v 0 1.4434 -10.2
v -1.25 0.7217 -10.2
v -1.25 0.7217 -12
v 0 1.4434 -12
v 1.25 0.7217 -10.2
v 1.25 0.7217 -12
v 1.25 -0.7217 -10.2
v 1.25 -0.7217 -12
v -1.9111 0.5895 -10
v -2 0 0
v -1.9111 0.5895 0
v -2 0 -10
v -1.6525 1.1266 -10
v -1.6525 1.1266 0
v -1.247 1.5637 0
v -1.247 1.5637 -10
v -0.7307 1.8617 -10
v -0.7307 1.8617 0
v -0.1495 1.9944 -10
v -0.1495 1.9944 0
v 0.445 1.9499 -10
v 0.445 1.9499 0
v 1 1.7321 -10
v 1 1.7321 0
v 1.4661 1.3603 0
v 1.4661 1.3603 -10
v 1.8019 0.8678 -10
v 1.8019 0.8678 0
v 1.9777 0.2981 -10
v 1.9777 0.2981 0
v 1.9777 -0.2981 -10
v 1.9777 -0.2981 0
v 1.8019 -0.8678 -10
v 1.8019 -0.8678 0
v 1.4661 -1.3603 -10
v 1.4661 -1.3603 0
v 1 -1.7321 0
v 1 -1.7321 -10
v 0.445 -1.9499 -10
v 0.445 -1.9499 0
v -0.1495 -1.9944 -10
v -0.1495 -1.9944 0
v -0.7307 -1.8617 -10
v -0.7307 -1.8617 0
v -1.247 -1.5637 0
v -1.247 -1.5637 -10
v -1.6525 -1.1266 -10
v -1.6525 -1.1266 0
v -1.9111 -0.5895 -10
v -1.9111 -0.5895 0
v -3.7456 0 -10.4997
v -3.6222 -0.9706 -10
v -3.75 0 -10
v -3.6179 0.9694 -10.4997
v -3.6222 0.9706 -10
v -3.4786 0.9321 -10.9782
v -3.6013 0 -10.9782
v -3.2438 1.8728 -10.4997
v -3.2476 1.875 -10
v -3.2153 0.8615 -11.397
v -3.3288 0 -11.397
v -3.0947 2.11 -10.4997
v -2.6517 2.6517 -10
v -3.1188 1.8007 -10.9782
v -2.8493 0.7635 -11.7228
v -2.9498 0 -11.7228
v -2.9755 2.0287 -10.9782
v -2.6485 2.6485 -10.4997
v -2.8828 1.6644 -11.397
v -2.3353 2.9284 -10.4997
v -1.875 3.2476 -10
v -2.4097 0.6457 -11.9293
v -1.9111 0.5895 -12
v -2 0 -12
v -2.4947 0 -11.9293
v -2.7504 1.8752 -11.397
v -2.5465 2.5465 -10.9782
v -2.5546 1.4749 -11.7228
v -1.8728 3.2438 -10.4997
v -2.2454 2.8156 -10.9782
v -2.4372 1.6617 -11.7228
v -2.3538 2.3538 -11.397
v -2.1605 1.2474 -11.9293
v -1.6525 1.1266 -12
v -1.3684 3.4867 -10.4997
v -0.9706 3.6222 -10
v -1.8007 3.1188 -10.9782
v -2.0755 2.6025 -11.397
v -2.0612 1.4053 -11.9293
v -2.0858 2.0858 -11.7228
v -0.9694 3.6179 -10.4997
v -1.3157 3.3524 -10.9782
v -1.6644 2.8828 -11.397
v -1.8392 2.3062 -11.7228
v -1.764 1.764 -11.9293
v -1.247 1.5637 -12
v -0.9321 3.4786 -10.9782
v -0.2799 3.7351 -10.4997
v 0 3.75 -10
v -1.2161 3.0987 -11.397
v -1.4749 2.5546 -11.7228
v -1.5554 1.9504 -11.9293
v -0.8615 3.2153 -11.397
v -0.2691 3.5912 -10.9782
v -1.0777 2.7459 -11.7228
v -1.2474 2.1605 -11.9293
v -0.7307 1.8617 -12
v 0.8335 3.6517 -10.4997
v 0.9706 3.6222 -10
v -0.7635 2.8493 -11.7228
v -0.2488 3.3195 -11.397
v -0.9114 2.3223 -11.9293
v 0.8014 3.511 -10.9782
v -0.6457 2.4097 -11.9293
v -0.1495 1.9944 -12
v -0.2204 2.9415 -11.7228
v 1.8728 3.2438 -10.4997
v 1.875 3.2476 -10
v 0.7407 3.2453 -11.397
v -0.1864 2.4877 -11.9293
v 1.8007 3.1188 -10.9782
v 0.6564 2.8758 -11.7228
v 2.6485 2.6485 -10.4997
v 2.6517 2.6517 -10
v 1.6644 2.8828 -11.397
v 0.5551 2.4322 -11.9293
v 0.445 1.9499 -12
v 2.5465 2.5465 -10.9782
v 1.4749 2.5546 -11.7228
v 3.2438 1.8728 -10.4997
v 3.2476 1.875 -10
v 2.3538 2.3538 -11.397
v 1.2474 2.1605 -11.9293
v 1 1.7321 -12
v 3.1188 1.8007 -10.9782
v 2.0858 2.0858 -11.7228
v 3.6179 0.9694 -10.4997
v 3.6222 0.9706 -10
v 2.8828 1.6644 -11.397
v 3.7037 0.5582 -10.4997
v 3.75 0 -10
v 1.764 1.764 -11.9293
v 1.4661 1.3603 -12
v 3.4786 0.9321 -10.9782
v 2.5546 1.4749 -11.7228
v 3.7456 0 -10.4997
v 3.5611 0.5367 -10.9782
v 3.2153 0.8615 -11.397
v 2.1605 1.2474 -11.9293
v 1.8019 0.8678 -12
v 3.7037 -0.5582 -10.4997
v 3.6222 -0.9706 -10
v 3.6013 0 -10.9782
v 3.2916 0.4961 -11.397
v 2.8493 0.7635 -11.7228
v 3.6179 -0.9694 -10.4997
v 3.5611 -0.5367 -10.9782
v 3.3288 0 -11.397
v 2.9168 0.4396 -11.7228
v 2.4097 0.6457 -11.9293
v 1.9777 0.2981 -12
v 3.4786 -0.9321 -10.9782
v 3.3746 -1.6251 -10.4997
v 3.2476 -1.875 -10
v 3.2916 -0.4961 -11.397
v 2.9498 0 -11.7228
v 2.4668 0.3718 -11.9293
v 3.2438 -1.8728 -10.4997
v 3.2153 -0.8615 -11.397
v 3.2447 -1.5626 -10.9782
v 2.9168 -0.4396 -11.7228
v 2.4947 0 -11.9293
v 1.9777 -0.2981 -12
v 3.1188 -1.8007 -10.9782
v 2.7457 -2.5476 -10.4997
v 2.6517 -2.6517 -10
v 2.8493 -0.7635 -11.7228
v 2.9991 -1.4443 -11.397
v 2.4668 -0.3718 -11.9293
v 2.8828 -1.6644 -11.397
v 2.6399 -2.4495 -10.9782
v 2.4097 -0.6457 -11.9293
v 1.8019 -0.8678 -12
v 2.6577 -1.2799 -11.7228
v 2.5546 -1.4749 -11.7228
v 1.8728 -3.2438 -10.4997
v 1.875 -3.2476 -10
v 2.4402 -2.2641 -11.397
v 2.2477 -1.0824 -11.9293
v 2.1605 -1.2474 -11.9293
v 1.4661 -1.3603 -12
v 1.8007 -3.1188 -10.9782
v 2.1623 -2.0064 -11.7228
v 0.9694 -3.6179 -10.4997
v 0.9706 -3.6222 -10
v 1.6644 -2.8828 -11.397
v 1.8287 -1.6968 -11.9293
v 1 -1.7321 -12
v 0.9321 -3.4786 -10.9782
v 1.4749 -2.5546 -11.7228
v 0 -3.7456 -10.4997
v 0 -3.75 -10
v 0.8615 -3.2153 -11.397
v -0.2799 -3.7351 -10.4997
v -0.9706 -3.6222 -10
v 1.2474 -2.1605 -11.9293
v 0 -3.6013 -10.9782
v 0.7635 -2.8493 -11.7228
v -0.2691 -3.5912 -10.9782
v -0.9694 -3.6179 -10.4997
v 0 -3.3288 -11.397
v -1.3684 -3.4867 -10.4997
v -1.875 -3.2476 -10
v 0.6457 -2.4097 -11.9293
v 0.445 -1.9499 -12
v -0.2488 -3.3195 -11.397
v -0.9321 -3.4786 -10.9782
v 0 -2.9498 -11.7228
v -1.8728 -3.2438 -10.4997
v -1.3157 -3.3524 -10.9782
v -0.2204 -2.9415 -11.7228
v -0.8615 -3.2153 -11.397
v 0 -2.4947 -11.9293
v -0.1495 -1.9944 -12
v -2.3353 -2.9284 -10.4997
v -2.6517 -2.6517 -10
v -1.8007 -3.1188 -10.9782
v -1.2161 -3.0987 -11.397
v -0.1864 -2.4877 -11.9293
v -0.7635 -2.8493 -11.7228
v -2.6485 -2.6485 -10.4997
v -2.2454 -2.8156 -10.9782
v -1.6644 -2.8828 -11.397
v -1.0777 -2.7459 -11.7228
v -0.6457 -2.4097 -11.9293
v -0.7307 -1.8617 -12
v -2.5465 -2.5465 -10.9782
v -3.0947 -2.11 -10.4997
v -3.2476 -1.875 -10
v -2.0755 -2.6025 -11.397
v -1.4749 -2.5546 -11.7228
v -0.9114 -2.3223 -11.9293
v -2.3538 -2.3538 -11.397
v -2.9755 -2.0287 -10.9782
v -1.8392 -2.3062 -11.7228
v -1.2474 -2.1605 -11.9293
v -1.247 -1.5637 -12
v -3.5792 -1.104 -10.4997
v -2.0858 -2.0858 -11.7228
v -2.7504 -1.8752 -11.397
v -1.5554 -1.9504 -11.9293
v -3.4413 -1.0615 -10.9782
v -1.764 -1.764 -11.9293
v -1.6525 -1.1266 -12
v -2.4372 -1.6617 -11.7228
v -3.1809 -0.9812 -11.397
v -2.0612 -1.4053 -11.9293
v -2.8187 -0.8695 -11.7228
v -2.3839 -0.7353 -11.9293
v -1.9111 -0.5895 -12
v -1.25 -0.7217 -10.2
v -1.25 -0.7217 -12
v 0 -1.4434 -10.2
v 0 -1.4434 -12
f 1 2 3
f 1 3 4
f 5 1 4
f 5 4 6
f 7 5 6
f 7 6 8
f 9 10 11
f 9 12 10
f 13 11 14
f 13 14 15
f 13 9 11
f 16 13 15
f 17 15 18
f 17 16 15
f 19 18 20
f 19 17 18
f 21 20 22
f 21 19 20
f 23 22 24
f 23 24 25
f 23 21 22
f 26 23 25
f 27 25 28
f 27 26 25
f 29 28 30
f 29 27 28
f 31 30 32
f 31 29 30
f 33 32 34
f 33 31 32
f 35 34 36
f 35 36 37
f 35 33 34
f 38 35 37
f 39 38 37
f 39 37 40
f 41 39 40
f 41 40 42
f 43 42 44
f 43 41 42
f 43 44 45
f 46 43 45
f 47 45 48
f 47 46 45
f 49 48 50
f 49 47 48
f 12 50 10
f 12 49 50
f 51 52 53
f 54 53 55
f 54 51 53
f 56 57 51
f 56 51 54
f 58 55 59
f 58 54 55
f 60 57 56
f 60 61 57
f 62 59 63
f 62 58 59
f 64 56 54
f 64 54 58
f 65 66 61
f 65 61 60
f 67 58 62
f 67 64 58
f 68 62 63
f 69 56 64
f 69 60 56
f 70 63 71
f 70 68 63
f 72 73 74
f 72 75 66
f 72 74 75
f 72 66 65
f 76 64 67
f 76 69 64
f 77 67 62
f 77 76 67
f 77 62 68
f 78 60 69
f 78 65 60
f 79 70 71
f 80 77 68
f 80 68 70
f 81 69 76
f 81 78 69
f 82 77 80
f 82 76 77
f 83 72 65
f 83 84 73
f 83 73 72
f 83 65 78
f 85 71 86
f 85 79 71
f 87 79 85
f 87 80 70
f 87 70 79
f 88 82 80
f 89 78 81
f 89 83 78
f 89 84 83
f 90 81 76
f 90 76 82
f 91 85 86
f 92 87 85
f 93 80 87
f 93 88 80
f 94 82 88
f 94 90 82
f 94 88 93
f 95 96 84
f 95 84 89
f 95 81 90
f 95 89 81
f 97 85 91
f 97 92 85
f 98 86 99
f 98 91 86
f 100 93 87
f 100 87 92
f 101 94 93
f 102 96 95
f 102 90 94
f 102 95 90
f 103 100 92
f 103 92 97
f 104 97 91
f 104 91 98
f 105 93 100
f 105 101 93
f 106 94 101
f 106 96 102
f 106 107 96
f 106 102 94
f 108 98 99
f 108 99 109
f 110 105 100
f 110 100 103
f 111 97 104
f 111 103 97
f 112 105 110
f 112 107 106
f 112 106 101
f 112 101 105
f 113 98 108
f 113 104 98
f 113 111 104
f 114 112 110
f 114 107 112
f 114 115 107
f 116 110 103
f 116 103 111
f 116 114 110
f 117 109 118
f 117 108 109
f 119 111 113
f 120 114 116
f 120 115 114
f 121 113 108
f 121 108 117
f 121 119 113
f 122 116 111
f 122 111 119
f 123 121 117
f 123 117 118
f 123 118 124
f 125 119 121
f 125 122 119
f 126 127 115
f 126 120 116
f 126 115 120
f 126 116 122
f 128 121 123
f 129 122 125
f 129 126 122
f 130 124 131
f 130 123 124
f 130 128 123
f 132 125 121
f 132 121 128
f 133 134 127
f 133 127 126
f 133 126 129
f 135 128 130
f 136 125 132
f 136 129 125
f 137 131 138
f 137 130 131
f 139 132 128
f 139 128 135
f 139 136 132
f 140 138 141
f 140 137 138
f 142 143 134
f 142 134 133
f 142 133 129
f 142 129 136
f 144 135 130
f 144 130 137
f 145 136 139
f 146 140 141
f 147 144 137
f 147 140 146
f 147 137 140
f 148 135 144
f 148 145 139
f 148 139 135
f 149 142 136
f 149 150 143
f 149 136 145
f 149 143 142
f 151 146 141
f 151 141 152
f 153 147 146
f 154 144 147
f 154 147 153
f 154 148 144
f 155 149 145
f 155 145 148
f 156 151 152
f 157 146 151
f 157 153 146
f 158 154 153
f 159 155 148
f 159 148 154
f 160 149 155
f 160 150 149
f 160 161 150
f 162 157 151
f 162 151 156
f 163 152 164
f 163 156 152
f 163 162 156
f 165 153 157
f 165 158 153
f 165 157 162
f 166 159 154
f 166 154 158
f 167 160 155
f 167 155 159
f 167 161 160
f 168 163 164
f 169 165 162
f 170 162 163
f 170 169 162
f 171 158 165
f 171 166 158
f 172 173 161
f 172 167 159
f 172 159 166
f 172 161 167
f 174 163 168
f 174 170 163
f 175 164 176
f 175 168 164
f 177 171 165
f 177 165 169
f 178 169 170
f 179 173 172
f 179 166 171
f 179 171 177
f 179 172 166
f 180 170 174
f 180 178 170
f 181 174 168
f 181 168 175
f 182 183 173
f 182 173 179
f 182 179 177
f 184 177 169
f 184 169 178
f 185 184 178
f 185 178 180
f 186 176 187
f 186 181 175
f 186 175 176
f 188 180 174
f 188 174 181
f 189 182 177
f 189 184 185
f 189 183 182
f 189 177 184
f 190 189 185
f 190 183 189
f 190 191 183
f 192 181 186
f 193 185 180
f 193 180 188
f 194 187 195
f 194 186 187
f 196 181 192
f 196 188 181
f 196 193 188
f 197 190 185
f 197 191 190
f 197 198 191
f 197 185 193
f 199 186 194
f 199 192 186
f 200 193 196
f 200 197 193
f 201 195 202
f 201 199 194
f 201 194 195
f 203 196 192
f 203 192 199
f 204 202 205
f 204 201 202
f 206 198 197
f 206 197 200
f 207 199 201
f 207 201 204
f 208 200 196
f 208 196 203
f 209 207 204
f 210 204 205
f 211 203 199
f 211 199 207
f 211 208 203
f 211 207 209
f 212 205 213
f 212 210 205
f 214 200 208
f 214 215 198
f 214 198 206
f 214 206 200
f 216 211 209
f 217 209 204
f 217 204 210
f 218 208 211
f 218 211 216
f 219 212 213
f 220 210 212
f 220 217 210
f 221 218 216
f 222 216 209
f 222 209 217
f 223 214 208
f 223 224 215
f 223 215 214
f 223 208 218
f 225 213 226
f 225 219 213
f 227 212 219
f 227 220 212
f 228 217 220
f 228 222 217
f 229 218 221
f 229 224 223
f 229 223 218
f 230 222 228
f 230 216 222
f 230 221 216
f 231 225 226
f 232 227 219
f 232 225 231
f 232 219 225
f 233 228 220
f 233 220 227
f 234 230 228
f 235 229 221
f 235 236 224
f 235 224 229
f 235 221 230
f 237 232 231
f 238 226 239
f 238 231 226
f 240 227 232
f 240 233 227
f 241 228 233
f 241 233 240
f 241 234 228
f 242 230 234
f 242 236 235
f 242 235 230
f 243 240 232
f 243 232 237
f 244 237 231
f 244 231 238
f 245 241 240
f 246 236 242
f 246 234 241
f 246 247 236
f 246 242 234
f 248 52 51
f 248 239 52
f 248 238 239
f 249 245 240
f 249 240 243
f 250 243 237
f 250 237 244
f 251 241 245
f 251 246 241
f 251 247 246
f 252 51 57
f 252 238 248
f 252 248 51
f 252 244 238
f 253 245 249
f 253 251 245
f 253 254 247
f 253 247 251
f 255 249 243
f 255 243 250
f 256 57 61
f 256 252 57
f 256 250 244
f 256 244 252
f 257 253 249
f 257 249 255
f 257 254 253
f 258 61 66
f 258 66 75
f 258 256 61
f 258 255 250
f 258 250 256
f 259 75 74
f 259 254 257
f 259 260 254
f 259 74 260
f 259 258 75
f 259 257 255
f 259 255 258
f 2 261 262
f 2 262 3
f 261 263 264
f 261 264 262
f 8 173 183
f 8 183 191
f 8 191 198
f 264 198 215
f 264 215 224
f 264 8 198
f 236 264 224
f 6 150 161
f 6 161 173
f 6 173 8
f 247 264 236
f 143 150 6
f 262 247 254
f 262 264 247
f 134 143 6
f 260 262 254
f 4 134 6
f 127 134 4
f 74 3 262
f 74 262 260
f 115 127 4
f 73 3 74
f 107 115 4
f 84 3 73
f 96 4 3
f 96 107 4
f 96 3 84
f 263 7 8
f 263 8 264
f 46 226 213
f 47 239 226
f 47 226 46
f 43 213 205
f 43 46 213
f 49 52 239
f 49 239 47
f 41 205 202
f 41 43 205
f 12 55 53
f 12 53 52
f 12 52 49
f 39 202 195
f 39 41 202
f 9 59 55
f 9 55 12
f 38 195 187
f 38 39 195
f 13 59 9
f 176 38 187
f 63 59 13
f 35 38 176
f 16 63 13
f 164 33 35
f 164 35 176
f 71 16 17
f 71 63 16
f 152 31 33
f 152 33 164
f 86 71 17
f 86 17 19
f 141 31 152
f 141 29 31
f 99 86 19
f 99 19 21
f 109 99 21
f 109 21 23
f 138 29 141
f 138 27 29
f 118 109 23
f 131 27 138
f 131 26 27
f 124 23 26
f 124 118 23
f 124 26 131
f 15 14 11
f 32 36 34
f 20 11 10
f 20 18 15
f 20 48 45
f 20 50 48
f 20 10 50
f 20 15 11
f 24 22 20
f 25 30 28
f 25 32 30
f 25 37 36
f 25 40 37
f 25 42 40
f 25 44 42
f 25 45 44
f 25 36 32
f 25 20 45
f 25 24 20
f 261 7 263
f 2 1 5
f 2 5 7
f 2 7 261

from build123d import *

# Parameters (mm, degrees)
CUT_EXTRUDE1_DEPTH = 1.8


with BuildPart() as part:
    # Sketch1 → Revolve1 (revolve)
    with BuildSketch(Plane(origin=(0, 0, 0), x_dir=(1, 0, 0), z_dir=(0, 1, 0))):
        with BuildLine():
            Line((0, 0), (-2, 0))
            Line((-2, 0), (-2, 10))
            Line((-2, 10), (-3.75, 10))
            ThreePointArc((-3.75, 10), (-3.328768227, 11.397047198), (-2, 12))
            Line((-2, 12), (0, 12))
            Line((0, 12), (0, 0))
        make_face()
    revolve(axis=Axis((0, 0, 0), (0, 0, -1)))

    # Sketch2 → Cut-Extrude1 (cut)
    with BuildSketch(Plane(origin=(0, 0, -12), x_dir=(-1, 0, 0), z_dir=(0, 0, -1))):
        Polygon((0, -1.443375673), (1.25, -0.721687836), (1.25, 0.721687836), (0, 1.443375673), (-1.25, 0.721687836), (-1.25, -0.721687836), align=None)
    extrude(amount=-CUT_EXTRUDE1_DEPTH, mode=Mode.SUBTRACT)


solid = part.part
